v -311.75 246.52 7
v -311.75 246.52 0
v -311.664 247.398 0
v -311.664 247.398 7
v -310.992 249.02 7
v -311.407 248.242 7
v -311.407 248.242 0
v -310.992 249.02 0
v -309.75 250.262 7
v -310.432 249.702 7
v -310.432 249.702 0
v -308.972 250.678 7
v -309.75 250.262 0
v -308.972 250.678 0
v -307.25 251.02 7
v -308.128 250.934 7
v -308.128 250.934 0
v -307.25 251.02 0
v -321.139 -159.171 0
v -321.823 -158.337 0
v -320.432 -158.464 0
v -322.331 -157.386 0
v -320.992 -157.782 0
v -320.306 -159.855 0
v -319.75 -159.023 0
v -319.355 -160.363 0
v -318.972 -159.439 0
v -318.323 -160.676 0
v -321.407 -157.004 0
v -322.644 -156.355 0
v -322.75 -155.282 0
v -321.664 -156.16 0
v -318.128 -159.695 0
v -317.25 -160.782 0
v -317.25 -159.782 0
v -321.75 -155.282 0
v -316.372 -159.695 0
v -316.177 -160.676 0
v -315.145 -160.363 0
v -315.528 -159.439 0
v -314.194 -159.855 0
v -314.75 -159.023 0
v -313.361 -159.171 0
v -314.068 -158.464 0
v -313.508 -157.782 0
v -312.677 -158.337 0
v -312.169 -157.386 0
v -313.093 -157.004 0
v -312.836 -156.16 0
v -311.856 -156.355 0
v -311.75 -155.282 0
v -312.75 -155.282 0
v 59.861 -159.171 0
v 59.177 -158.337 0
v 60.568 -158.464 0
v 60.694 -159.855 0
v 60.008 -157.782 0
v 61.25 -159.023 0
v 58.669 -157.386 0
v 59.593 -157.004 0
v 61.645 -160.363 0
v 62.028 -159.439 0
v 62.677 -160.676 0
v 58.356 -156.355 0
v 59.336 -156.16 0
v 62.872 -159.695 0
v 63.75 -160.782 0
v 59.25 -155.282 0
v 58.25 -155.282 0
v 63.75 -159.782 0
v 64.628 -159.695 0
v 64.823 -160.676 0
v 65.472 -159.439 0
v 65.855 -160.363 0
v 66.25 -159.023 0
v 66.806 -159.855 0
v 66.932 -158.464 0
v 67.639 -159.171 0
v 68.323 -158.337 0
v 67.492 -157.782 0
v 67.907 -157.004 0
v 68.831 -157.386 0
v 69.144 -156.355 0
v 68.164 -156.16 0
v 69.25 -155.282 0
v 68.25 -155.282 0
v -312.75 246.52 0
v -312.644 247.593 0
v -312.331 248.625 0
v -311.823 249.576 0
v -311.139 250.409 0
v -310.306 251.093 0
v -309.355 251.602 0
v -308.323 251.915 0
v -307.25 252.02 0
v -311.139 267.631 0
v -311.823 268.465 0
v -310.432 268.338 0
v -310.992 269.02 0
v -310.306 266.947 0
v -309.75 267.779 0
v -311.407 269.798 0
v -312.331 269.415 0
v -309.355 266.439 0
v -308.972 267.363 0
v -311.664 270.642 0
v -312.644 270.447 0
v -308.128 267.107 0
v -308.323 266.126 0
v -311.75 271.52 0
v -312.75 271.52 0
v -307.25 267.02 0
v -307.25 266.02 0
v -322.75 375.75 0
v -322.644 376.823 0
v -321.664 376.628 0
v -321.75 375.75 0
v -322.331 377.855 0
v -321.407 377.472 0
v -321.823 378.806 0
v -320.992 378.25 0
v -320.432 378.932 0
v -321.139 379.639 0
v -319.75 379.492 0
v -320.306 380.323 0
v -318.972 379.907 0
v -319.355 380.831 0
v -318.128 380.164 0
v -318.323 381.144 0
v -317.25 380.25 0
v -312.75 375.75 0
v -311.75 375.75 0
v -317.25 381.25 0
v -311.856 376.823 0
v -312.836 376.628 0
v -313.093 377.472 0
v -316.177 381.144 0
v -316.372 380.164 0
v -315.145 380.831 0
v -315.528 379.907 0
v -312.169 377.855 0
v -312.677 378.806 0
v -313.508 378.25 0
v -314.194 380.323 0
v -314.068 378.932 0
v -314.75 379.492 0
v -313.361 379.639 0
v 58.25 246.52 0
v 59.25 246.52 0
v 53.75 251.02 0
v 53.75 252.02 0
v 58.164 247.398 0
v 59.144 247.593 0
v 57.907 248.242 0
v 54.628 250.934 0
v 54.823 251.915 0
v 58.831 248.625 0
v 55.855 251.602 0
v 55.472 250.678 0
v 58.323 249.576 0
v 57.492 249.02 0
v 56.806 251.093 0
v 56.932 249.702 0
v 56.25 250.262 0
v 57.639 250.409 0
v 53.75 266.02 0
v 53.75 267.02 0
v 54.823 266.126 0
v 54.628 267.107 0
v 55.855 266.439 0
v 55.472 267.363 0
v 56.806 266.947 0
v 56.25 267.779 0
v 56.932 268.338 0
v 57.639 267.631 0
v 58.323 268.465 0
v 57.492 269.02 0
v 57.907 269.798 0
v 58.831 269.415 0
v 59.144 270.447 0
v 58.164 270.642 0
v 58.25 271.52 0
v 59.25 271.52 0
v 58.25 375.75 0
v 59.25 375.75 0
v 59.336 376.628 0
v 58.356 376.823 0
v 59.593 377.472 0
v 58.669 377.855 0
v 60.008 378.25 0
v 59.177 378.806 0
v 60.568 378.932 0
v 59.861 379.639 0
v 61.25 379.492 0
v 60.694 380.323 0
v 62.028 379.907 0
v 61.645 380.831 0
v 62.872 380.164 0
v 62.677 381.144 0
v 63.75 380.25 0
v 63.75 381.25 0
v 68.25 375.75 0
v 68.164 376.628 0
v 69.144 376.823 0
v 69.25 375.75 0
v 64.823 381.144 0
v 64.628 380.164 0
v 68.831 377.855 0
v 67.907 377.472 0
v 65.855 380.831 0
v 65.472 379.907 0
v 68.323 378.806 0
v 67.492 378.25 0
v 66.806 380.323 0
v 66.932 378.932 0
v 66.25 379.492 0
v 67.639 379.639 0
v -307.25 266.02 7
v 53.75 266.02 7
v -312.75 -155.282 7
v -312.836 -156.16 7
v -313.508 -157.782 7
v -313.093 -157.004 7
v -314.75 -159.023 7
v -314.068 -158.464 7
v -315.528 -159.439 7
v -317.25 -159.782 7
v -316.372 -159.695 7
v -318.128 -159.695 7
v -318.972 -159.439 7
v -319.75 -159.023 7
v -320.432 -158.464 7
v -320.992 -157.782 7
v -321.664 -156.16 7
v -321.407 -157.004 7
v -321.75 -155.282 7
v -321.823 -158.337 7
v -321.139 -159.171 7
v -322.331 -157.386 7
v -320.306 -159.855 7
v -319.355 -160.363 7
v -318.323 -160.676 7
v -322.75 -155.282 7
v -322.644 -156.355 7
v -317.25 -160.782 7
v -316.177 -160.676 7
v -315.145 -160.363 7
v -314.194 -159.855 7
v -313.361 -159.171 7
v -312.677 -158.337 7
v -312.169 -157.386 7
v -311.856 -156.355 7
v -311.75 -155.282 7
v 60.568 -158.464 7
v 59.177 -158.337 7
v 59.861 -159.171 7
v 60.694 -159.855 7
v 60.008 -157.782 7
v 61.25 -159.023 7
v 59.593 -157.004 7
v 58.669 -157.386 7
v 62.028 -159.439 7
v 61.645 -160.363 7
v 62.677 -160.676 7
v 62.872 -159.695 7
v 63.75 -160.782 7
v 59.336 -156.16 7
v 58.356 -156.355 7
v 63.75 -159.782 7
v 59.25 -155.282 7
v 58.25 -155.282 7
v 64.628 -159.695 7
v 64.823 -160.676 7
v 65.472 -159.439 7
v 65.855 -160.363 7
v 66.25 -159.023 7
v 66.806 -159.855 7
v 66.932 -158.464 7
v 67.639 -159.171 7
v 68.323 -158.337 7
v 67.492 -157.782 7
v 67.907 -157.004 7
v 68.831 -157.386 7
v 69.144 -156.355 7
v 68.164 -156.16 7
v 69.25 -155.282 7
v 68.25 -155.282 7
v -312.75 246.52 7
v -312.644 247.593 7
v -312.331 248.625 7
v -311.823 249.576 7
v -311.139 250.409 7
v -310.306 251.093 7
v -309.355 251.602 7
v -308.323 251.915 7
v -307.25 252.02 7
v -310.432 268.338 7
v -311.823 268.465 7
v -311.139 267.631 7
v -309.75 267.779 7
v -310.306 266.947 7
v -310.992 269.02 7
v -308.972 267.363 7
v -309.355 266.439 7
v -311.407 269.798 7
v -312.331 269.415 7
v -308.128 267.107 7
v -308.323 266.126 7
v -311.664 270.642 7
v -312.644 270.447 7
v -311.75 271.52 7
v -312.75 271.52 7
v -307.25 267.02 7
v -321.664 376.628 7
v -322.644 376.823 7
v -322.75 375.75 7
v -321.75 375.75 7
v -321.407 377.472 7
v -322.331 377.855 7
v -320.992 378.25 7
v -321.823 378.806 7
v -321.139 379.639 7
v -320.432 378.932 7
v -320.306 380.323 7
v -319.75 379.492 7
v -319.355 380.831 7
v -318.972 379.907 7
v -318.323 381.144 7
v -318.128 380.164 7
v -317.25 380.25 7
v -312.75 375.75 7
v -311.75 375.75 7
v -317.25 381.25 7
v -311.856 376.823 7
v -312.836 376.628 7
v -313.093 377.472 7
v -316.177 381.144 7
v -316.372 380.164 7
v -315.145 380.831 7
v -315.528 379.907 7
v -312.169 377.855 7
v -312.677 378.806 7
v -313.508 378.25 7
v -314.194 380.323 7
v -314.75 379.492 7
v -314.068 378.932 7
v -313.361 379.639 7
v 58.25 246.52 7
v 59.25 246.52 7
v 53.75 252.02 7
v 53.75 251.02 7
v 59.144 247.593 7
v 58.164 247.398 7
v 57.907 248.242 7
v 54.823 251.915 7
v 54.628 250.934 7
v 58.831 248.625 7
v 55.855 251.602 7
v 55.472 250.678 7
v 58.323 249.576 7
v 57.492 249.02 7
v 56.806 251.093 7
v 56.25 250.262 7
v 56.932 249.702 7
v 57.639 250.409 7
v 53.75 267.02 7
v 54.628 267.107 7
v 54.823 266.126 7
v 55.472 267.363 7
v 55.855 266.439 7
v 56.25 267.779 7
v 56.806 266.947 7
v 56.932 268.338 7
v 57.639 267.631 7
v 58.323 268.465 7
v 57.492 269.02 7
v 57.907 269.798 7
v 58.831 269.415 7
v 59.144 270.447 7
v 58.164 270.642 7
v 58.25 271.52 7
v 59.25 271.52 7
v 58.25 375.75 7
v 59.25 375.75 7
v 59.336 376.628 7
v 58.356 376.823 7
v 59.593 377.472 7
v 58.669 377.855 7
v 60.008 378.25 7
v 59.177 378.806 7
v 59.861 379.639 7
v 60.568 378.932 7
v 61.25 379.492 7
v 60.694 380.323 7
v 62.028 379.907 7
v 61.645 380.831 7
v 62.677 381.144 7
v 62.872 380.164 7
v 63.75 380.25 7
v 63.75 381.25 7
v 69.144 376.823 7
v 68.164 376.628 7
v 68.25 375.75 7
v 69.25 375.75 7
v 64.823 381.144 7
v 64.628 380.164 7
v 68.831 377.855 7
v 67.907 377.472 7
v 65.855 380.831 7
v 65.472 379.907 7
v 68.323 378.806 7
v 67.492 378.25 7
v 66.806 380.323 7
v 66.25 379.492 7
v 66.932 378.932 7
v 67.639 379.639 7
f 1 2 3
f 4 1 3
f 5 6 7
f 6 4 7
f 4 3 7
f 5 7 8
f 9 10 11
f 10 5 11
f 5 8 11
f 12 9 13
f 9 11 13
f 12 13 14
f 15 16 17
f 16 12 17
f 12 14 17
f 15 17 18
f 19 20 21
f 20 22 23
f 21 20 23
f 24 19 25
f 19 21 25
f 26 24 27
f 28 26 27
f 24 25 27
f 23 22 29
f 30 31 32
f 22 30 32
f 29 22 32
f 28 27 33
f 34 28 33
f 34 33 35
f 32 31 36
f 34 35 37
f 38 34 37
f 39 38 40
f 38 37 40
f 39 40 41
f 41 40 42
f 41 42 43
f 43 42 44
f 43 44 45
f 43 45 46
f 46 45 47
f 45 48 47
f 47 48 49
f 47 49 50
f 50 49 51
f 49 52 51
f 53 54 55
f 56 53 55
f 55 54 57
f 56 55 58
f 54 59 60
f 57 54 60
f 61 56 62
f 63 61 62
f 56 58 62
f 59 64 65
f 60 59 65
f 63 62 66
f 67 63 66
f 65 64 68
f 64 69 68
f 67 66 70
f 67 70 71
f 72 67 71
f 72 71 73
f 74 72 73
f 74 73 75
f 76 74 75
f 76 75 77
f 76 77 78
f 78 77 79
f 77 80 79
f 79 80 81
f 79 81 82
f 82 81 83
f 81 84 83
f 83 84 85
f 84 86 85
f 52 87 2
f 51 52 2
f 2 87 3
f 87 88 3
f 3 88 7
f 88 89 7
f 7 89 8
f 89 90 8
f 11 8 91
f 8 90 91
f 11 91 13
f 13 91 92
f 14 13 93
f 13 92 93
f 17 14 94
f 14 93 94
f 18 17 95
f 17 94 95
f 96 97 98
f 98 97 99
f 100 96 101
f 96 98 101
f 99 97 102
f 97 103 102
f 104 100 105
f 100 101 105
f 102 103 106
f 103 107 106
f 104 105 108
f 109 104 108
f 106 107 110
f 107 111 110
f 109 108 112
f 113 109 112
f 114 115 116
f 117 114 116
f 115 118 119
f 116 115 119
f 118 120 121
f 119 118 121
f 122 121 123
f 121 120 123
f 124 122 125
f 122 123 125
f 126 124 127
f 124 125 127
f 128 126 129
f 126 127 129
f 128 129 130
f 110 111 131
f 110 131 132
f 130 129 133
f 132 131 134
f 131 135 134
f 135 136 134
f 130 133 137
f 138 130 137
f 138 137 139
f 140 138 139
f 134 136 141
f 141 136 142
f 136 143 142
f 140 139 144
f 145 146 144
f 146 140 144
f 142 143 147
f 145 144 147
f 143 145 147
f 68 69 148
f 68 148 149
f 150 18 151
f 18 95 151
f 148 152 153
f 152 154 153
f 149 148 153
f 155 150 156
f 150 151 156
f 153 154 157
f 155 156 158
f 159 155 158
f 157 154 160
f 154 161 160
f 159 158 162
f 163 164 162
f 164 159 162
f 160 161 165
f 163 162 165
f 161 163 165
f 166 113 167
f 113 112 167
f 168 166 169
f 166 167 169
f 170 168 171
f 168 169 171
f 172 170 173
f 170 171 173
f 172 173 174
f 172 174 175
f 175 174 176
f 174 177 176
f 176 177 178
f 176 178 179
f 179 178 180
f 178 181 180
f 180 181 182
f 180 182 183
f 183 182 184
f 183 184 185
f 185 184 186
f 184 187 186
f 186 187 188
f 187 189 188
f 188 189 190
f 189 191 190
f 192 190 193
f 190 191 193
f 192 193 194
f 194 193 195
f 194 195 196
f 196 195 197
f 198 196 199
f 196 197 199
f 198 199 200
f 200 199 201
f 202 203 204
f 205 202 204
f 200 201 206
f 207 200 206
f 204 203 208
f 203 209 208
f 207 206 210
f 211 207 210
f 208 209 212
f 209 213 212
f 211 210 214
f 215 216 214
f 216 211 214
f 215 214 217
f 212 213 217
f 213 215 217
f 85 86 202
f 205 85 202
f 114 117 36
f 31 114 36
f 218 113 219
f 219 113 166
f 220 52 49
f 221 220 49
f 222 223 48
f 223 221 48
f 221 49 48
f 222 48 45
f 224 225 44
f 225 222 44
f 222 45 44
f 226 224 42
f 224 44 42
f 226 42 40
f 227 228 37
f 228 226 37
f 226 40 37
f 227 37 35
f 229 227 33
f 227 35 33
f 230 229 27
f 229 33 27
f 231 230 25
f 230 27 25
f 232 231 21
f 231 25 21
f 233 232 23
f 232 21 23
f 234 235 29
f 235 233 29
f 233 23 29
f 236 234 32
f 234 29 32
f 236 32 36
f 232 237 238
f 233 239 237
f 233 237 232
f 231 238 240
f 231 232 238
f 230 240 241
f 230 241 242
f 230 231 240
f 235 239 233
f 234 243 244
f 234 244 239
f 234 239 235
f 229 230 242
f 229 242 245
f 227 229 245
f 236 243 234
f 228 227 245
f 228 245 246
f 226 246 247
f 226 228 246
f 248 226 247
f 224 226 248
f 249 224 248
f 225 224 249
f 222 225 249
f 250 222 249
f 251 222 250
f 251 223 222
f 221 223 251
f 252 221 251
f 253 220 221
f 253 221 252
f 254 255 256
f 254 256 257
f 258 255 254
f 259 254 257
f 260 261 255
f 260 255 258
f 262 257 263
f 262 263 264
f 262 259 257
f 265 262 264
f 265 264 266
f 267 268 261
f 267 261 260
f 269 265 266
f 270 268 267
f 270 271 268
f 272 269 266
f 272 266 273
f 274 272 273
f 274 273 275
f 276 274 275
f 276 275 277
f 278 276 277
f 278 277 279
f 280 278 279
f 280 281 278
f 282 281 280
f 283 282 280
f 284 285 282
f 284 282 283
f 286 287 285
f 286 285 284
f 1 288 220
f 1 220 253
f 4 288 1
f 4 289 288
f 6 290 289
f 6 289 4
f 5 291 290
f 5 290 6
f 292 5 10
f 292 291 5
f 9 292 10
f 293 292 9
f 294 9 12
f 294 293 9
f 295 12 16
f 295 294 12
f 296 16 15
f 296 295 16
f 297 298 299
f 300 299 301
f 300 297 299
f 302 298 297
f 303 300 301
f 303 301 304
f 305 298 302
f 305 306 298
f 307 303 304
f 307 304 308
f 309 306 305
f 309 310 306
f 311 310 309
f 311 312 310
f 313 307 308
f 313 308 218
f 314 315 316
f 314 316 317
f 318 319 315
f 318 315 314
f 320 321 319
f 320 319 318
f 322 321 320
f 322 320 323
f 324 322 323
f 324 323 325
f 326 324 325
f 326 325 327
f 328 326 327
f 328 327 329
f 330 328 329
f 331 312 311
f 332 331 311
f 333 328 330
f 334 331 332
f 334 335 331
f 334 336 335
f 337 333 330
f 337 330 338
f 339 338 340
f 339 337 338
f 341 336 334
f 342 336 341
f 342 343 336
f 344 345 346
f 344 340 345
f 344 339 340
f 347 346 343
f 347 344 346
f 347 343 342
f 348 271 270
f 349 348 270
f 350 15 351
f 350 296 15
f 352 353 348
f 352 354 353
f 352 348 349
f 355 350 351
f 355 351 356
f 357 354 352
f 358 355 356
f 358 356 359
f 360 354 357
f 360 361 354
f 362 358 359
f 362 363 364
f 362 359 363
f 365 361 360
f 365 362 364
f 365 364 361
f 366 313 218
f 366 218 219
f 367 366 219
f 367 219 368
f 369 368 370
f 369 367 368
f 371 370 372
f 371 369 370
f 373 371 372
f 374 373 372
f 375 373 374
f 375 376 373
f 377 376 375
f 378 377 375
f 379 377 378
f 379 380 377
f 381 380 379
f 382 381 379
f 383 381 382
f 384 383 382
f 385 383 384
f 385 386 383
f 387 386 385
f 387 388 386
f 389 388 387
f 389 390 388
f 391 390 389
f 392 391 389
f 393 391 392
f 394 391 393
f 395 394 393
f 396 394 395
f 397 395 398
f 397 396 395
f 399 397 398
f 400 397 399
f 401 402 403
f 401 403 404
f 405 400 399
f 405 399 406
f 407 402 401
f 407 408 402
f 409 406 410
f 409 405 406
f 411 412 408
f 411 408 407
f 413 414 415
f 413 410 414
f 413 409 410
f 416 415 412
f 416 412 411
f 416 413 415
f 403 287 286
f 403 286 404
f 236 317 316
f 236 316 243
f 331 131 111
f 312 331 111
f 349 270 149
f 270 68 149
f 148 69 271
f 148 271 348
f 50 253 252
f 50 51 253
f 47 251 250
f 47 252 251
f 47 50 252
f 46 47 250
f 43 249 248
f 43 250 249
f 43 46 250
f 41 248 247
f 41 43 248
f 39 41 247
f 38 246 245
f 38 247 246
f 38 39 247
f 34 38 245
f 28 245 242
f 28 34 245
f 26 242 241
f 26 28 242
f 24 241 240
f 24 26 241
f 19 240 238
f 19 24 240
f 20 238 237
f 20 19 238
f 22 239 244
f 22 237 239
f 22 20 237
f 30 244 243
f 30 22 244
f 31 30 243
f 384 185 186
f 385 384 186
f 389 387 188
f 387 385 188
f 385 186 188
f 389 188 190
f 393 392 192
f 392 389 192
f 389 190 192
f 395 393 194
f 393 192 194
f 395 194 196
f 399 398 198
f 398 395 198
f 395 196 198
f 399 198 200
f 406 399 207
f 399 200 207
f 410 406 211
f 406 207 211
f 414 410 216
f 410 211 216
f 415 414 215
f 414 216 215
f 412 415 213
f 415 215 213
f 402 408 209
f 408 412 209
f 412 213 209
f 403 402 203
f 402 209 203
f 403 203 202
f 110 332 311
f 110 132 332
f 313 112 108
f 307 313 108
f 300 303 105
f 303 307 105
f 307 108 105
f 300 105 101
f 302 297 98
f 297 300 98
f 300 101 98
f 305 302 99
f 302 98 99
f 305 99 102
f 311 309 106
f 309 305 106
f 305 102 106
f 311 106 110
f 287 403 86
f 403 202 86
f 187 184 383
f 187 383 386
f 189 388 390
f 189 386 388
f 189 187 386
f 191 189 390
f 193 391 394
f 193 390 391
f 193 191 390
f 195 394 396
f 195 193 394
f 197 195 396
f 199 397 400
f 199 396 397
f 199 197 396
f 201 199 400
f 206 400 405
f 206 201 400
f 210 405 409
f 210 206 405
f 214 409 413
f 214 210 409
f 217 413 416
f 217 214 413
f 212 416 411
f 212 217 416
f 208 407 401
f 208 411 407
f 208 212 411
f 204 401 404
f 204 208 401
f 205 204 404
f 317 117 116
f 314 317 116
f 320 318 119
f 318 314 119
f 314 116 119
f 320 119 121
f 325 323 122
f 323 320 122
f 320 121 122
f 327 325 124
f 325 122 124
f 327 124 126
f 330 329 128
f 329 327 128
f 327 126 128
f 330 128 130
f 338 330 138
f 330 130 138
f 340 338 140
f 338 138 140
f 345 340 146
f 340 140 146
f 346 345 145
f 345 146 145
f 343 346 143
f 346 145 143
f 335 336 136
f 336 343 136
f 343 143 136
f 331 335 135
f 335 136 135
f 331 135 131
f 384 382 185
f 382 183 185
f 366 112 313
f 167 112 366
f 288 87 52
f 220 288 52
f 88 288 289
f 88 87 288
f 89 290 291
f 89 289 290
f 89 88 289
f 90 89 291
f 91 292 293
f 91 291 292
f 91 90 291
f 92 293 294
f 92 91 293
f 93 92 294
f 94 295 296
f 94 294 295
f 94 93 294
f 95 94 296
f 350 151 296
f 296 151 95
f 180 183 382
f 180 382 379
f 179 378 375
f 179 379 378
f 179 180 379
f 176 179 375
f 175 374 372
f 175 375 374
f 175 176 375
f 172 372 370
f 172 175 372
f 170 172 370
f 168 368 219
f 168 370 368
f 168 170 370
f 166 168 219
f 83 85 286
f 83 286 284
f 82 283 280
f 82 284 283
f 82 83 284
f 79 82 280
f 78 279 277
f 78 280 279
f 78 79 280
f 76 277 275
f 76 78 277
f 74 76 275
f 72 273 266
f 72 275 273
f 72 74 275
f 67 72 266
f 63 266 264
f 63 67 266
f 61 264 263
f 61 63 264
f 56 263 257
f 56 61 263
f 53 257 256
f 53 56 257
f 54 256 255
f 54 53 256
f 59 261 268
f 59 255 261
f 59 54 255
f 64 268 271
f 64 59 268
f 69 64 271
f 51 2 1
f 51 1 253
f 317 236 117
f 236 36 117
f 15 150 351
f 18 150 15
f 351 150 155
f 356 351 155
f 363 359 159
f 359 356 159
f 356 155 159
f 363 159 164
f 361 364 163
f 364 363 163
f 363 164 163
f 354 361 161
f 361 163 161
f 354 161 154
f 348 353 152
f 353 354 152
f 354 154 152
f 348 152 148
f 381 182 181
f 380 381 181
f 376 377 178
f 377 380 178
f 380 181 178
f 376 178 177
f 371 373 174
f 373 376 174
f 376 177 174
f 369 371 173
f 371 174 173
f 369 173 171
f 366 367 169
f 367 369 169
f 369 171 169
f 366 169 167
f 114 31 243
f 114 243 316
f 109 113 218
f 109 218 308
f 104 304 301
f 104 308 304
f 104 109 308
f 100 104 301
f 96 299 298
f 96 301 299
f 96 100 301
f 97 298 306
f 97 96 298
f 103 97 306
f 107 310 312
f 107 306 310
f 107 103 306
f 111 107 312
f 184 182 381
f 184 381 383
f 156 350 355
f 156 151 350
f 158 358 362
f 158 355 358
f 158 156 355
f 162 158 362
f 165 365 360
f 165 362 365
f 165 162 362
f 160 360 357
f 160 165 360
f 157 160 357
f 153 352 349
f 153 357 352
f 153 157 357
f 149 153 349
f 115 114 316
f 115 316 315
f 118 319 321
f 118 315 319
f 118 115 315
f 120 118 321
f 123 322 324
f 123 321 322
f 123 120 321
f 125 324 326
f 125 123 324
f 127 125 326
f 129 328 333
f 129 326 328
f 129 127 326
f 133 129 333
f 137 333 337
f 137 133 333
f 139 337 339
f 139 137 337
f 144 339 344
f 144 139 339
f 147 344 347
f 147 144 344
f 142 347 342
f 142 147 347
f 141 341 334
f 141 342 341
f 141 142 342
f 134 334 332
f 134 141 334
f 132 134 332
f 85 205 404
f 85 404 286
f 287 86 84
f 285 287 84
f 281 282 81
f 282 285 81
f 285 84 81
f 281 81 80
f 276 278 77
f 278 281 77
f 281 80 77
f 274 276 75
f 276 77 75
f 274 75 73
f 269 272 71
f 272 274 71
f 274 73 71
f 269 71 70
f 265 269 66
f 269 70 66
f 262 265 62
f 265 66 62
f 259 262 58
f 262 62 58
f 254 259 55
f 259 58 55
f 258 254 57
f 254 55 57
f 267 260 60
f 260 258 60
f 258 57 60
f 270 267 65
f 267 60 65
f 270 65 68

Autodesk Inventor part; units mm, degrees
ref_plane "YZ Plane" through (0, 0, 0) normal (1, 0, 0) x (0, 1, 0)
ref_plane "XZ Plane" through (0, 0, 0) normal (0, 1, 0) x (-1, 0, 0)
ref_plane "XY Plane" through (0, 0, 0) normal (0, 0, 1) x (1, 0, 0)
sketch "Эскиз1" plane through (0, 0, 0) normal (0, 0, 1) x (1, 0, 0)
  arc A0 (68.75, 375.75) -> (58.75, 375.75) centre (63.75, 375.75) ccw
  arc A1 (53.75, 266.5202) -> (58.75, 271.5202) centre (53.75, 271.5202) ccw
  arc A2 (58.75, 246.5202) -> (53.75, 251.5202) centre (53.75, 246.5202) ccw
  arc A3 (-312.25, 375.75) -> (-322.25, 375.75) centre (-317.25, 375.75) ccw
  arc A4 (-312.25, 271.5202) -> (-307.25, 266.5202) centre (-307.25, 271.5202) ccw
  arc A5 (-307.25, 251.5202) -> (-312.25, 246.5202) centre (-307.25, 246.5202) ccw
  arc A6 (-322.25, -155.2817) -> (-312.25, -155.2817) centre (-317.25, -155.2817) ccw
  arc A7 (58.75, -155.2817) -> (68.75, -155.2817) centre (63.75, -155.2817) ccw
  line L0 (68.75, -155.2817) -> (68.75, 375.75)
  line L1 (58.75, 375.75) -> (58.75, 271.5202)
  line L2 (53.75, 266.5202) -> (-307.25, 266.5202)
  line L3 (-307.25, 251.5202) -> (53.75, 251.5202)
  line L4 (58.75, 246.5202) -> (58.75, -155.2817)
  line L5 (-312.25, -155.2817) -> (-312.25, 246.5202)
  line L6 (-312.25, 271.5202) -> (-312.25, 375.75)
  line L7 (-322.25, 375.75) -> (-322.25, -155.2817)
  line L8 (-307.25, 267.0202) -> (53.75, 267.0202)
  arc A8 (53.75, 267.0202) -> (58.25, 271.5202) centre (53.75, 271.5202) ccw
  line L9 (58.25, 271.5202) -> (58.25, 375.75)
  arc A9 (69.25, 375.75) -> (58.25, 375.75) centre (63.75, 375.75) ccw
  line L10 (69.25, 375.75) -> (69.25, -155.2817)
  arc A10 (58.25, -155.2817) -> (69.25, -155.2817) centre (63.75, -155.2817) ccw
  line L11 (58.25, -155.2817) -> (58.25, 246.5202)
  arc A11 (58.25, 246.5202) -> (53.75, 251.0202) centre (53.75, 246.5202) ccw
  line L12 (53.75, 251.0202) -> (-307.25, 251.0202)
  arc A12 (-307.25, 251.0202) -> (-311.75, 246.5202) centre (-307.25, 246.5202) ccw
  line L13 (-311.75, 246.5202) -> (-311.75, -155.2817)
  arc A13 (-322.75, -155.2817) -> (-311.75, -155.2817) centre (-317.25, -155.2817) ccw
  line L14 (-322.75, -155.2817) -> (-322.75, 375.75)
  arc A14 (-311.75, 375.75) -> (-322.75, 375.75) centre (-317.25, 375.75) ccw
  line L15 (-311.75, 375.75) -> (-311.75, 271.5202)
  arc A15 (-311.75, 271.5202) -> (-307.25, 267.0202) centre (-307.25, 271.5202) ccw
  line L16 (-307.25, 266.0202) -> (53.75, 266.0202)
  arc A16 (53.75, 266.0202) -> (59.25, 271.5202) centre (53.75, 271.5202) ccw
  line L17 (59.25, 271.5202) -> (59.25, 375.75)
  arc A17 (68.25, 375.75) -> (59.25, 375.75) centre (63.75, 375.75) ccw
  line L18 (68.25, 375.75) -> (68.25, -155.2817)
  arc A18 (59.25, -155.2817) -> (68.25, -155.2817) centre (63.75, -155.2817) ccw
  line L19 (59.25, -155.2817) -> (59.25, 246.5202)
  arc A19 (59.25, 246.5202) -> (53.75, 252.0202) centre (53.75, 246.5202) ccw
  line L20 (53.75, 252.0202) -> (-307.25, 252.0202)
  arc A20 (-307.25, 252.0202) -> (-312.75, 246.5202) centre (-307.25, 246.5202) ccw
  line L21 (-312.75, 246.5202) -> (-312.75, -155.2817)
  arc A21 (-321.75, -155.2817) -> (-312.75, -155.2817) centre (-317.25, -155.2817) ccw
  line L22 (-321.75, -155.2817) -> (-321.75, 375.75)
  arc A22 (-312.75, 375.75) -> (-321.75, 375.75) centre (-317.25, 375.75) ccw
  line L23 (-312.75, 375.75) -> (-312.75, 271.5202)
  arc A23 (-312.75, 271.5202) -> (-307.25, 266.0202) centre (-307.25, 271.5202) ccw
  point P0 (70, 190)
  dimension "d0" = 0.5
  dimension "d1" = 0.5
extrude "Выдавливание1" add sketch "Эскиз1" along normal blind 7 contours L0 A7 L4 A2 L3 A5 L5 A6 L7 A3 L6 A4 L2 A1 L1 A0 | L8 A8 L9 A9 L10 A10 L11 A11 L12 A12 L13 A13 L14 A14 L15 A15
properties part number "gt2_belt"
